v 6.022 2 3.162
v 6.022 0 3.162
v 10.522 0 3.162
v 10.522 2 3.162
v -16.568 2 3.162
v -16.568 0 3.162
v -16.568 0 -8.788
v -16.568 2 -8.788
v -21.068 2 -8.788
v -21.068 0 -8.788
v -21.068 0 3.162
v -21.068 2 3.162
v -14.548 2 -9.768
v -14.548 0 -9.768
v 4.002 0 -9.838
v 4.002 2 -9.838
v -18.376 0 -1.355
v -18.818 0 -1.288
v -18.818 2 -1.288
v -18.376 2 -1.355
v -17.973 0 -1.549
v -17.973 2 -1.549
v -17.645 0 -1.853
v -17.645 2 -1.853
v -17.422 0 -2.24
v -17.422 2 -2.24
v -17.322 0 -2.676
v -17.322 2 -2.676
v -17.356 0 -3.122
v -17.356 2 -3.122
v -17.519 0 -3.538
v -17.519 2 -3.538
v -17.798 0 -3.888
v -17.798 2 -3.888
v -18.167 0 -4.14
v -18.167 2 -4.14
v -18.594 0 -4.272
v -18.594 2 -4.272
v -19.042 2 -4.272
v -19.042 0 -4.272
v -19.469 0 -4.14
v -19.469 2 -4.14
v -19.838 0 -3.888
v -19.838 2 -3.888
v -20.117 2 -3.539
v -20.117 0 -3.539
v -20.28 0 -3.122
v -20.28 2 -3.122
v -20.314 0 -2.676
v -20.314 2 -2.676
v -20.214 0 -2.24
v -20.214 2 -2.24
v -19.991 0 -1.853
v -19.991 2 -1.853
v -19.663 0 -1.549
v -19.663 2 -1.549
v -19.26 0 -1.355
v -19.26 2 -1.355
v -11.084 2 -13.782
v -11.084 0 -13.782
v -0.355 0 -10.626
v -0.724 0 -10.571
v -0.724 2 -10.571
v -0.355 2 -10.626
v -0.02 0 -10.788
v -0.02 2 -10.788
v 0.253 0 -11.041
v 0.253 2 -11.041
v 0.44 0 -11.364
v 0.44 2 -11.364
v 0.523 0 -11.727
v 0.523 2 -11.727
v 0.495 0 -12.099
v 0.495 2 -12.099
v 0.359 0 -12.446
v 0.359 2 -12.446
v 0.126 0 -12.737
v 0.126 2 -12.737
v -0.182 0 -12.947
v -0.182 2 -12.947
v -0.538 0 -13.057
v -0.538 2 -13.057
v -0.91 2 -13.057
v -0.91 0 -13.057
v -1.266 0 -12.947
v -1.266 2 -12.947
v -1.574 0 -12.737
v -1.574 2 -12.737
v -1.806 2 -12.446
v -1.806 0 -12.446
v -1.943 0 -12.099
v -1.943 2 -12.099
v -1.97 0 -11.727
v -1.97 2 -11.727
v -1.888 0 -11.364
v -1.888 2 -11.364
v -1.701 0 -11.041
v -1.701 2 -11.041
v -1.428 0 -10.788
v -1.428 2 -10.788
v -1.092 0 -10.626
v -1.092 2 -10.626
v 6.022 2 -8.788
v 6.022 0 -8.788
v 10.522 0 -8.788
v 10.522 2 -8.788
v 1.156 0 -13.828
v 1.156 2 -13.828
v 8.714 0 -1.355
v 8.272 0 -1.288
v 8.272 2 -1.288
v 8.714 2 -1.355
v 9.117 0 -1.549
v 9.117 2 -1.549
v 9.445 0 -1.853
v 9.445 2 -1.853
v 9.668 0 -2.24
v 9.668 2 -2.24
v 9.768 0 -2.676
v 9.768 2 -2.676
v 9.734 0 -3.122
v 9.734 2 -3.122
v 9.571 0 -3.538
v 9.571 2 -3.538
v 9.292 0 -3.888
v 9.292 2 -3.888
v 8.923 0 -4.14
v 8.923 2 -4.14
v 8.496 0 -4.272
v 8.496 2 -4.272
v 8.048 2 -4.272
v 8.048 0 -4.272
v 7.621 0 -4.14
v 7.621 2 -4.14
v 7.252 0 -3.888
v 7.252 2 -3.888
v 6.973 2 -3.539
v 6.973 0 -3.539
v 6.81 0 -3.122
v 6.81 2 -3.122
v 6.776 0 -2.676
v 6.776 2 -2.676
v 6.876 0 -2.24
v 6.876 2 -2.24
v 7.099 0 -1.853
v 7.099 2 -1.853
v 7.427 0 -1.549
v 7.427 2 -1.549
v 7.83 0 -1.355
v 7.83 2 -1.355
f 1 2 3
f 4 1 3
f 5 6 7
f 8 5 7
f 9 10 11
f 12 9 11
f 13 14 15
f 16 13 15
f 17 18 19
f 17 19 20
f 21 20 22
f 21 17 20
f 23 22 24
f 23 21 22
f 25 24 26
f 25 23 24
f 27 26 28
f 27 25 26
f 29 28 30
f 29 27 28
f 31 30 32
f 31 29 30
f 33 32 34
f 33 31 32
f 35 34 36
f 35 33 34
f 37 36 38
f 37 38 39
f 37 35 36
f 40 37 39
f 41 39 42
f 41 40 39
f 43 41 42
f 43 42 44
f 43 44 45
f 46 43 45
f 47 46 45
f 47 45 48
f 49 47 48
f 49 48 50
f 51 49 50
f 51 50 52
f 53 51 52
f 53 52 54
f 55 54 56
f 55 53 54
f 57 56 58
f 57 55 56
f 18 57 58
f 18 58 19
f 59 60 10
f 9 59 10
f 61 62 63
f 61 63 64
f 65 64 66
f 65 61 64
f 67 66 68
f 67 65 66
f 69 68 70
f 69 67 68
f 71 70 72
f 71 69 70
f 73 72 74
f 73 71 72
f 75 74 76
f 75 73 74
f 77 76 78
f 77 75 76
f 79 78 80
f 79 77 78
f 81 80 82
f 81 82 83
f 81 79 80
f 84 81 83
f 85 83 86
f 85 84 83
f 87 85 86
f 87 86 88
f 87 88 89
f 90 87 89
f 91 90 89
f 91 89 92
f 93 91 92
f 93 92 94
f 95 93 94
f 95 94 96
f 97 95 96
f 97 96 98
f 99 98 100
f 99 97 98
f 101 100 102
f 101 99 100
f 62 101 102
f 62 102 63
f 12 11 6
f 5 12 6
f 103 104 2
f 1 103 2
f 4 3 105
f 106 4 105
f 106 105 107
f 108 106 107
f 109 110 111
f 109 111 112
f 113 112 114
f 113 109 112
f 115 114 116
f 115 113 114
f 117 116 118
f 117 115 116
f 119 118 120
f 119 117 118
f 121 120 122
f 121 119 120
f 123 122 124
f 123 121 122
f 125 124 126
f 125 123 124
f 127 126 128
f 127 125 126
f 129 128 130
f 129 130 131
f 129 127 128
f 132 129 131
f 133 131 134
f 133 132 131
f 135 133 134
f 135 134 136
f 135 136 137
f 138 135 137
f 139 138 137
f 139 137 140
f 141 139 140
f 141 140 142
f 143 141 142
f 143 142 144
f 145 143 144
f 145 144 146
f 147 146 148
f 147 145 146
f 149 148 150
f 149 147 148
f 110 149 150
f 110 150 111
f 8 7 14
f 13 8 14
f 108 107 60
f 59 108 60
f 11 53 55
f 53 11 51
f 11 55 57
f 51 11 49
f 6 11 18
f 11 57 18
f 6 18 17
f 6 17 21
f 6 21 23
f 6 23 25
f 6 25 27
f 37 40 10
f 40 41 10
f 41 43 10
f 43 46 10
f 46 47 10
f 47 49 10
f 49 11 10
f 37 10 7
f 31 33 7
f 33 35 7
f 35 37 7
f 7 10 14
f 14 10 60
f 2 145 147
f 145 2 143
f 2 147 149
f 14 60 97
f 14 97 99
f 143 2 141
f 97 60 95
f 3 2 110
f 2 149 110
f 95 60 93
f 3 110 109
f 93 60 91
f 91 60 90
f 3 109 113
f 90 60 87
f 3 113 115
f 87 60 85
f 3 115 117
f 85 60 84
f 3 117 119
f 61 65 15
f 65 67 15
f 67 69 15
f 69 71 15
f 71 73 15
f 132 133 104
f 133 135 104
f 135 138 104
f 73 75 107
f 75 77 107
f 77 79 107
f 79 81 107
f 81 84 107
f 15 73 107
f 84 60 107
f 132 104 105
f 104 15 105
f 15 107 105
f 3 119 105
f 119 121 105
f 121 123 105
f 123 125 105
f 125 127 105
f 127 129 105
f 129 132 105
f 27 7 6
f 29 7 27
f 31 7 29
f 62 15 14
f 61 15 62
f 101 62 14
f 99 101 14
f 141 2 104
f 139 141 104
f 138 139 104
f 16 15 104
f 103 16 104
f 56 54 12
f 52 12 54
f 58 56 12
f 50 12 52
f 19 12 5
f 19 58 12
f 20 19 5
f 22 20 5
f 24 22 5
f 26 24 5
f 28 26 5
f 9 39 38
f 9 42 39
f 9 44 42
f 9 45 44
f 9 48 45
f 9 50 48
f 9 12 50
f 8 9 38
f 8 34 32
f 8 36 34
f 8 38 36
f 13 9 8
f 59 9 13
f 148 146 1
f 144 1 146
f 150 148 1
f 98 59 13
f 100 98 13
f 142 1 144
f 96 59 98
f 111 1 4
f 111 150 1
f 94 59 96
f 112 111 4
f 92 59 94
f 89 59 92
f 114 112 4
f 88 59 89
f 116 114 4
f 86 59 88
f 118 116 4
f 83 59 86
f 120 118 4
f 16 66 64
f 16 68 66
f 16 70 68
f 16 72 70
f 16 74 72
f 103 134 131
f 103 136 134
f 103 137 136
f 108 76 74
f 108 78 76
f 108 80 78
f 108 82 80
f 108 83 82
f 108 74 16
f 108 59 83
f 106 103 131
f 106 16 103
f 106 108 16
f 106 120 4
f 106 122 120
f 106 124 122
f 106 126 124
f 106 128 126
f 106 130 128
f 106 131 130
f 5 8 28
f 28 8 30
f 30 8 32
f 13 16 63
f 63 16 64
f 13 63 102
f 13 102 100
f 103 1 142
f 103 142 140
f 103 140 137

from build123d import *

# Parameters (mm, degrees)
SKETCH1_R           = 1.5
SKETCH1_R_2         = 1.25
BOSS_EXTRUDE1_DEPTH = 2


with BuildPart() as part:
    # Sketch1 → Boss-Extrude1 (new body)
    with BuildSketch(Plane(origin=(0, 0, 0), x_dir=(1, 0, 0), z_dir=(0, 1, 0))):
        Polygon((-21.067974578, -3.1615), (-16.567974578, -3.1615), (-16.567974578, 8.7885), (-14.547974578, 9.7685), (4.002025422, 9.8385), (6.022025422, 8.7885), (6.022025422, -3.1615), (10.522025422, -3.1615), (10.522025422, 8.7885), (1.156070136, 13.827789026), (-11.083929864, 13.781600347), (-21.067974578, 8.7885), align=None)
        with Locations(Location((-18.817974578, 2.7885, 0), (0, 0, 270))):
            Circle(SKETCH1_R, mode=Mode.SUBTRACT)
        with Locations(Location((8.272025422, 2.7885, 0), (0, 0, 270))):
            Circle(SKETCH1_R, mode=Mode.SUBTRACT)
        with Locations(Location((-0.723929864, 11.820680446, 0), (0, 0, 270))):
            Circle(SKETCH1_R_2, mode=Mode.SUBTRACT)
    extrude(amount=BOSS_EXTRUDE1_DEPTH)


solid = part.part
